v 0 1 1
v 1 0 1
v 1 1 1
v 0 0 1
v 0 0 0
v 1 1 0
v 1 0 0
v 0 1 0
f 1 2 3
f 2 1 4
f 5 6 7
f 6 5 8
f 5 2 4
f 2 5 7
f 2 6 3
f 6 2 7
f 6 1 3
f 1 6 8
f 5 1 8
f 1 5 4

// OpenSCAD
/*
 * OpenSCAD Workshop Examples
 * Copyright (c) 2013 Anar Software LLC. < http://anars.com >
 *
 * This program is free software: you can redistribute it and/or modify it under
 * the terms of the GNU General Public License as published by the Free Software
 * Foundation, either version 3 of the License, or (at your option) any later
 * version.
 *
 * This program is distributed in the hope that it will be useful, but WITHOUT
 * ANY WARRANTY; without even the implied warranty of MERCHANTABILITY or FITNESS
 * FOR A PARTICULAR PURPOSE. See the GNU General Public License for more details.
 *
 * You should have received a copy of the GNU General Public License along with
 * this program. If not, see < http://www.gnu.org/licenses/ >
 *
 */
/*

Crates a cube with sides of that 1 unit length in the first octant.

*/

cube();
